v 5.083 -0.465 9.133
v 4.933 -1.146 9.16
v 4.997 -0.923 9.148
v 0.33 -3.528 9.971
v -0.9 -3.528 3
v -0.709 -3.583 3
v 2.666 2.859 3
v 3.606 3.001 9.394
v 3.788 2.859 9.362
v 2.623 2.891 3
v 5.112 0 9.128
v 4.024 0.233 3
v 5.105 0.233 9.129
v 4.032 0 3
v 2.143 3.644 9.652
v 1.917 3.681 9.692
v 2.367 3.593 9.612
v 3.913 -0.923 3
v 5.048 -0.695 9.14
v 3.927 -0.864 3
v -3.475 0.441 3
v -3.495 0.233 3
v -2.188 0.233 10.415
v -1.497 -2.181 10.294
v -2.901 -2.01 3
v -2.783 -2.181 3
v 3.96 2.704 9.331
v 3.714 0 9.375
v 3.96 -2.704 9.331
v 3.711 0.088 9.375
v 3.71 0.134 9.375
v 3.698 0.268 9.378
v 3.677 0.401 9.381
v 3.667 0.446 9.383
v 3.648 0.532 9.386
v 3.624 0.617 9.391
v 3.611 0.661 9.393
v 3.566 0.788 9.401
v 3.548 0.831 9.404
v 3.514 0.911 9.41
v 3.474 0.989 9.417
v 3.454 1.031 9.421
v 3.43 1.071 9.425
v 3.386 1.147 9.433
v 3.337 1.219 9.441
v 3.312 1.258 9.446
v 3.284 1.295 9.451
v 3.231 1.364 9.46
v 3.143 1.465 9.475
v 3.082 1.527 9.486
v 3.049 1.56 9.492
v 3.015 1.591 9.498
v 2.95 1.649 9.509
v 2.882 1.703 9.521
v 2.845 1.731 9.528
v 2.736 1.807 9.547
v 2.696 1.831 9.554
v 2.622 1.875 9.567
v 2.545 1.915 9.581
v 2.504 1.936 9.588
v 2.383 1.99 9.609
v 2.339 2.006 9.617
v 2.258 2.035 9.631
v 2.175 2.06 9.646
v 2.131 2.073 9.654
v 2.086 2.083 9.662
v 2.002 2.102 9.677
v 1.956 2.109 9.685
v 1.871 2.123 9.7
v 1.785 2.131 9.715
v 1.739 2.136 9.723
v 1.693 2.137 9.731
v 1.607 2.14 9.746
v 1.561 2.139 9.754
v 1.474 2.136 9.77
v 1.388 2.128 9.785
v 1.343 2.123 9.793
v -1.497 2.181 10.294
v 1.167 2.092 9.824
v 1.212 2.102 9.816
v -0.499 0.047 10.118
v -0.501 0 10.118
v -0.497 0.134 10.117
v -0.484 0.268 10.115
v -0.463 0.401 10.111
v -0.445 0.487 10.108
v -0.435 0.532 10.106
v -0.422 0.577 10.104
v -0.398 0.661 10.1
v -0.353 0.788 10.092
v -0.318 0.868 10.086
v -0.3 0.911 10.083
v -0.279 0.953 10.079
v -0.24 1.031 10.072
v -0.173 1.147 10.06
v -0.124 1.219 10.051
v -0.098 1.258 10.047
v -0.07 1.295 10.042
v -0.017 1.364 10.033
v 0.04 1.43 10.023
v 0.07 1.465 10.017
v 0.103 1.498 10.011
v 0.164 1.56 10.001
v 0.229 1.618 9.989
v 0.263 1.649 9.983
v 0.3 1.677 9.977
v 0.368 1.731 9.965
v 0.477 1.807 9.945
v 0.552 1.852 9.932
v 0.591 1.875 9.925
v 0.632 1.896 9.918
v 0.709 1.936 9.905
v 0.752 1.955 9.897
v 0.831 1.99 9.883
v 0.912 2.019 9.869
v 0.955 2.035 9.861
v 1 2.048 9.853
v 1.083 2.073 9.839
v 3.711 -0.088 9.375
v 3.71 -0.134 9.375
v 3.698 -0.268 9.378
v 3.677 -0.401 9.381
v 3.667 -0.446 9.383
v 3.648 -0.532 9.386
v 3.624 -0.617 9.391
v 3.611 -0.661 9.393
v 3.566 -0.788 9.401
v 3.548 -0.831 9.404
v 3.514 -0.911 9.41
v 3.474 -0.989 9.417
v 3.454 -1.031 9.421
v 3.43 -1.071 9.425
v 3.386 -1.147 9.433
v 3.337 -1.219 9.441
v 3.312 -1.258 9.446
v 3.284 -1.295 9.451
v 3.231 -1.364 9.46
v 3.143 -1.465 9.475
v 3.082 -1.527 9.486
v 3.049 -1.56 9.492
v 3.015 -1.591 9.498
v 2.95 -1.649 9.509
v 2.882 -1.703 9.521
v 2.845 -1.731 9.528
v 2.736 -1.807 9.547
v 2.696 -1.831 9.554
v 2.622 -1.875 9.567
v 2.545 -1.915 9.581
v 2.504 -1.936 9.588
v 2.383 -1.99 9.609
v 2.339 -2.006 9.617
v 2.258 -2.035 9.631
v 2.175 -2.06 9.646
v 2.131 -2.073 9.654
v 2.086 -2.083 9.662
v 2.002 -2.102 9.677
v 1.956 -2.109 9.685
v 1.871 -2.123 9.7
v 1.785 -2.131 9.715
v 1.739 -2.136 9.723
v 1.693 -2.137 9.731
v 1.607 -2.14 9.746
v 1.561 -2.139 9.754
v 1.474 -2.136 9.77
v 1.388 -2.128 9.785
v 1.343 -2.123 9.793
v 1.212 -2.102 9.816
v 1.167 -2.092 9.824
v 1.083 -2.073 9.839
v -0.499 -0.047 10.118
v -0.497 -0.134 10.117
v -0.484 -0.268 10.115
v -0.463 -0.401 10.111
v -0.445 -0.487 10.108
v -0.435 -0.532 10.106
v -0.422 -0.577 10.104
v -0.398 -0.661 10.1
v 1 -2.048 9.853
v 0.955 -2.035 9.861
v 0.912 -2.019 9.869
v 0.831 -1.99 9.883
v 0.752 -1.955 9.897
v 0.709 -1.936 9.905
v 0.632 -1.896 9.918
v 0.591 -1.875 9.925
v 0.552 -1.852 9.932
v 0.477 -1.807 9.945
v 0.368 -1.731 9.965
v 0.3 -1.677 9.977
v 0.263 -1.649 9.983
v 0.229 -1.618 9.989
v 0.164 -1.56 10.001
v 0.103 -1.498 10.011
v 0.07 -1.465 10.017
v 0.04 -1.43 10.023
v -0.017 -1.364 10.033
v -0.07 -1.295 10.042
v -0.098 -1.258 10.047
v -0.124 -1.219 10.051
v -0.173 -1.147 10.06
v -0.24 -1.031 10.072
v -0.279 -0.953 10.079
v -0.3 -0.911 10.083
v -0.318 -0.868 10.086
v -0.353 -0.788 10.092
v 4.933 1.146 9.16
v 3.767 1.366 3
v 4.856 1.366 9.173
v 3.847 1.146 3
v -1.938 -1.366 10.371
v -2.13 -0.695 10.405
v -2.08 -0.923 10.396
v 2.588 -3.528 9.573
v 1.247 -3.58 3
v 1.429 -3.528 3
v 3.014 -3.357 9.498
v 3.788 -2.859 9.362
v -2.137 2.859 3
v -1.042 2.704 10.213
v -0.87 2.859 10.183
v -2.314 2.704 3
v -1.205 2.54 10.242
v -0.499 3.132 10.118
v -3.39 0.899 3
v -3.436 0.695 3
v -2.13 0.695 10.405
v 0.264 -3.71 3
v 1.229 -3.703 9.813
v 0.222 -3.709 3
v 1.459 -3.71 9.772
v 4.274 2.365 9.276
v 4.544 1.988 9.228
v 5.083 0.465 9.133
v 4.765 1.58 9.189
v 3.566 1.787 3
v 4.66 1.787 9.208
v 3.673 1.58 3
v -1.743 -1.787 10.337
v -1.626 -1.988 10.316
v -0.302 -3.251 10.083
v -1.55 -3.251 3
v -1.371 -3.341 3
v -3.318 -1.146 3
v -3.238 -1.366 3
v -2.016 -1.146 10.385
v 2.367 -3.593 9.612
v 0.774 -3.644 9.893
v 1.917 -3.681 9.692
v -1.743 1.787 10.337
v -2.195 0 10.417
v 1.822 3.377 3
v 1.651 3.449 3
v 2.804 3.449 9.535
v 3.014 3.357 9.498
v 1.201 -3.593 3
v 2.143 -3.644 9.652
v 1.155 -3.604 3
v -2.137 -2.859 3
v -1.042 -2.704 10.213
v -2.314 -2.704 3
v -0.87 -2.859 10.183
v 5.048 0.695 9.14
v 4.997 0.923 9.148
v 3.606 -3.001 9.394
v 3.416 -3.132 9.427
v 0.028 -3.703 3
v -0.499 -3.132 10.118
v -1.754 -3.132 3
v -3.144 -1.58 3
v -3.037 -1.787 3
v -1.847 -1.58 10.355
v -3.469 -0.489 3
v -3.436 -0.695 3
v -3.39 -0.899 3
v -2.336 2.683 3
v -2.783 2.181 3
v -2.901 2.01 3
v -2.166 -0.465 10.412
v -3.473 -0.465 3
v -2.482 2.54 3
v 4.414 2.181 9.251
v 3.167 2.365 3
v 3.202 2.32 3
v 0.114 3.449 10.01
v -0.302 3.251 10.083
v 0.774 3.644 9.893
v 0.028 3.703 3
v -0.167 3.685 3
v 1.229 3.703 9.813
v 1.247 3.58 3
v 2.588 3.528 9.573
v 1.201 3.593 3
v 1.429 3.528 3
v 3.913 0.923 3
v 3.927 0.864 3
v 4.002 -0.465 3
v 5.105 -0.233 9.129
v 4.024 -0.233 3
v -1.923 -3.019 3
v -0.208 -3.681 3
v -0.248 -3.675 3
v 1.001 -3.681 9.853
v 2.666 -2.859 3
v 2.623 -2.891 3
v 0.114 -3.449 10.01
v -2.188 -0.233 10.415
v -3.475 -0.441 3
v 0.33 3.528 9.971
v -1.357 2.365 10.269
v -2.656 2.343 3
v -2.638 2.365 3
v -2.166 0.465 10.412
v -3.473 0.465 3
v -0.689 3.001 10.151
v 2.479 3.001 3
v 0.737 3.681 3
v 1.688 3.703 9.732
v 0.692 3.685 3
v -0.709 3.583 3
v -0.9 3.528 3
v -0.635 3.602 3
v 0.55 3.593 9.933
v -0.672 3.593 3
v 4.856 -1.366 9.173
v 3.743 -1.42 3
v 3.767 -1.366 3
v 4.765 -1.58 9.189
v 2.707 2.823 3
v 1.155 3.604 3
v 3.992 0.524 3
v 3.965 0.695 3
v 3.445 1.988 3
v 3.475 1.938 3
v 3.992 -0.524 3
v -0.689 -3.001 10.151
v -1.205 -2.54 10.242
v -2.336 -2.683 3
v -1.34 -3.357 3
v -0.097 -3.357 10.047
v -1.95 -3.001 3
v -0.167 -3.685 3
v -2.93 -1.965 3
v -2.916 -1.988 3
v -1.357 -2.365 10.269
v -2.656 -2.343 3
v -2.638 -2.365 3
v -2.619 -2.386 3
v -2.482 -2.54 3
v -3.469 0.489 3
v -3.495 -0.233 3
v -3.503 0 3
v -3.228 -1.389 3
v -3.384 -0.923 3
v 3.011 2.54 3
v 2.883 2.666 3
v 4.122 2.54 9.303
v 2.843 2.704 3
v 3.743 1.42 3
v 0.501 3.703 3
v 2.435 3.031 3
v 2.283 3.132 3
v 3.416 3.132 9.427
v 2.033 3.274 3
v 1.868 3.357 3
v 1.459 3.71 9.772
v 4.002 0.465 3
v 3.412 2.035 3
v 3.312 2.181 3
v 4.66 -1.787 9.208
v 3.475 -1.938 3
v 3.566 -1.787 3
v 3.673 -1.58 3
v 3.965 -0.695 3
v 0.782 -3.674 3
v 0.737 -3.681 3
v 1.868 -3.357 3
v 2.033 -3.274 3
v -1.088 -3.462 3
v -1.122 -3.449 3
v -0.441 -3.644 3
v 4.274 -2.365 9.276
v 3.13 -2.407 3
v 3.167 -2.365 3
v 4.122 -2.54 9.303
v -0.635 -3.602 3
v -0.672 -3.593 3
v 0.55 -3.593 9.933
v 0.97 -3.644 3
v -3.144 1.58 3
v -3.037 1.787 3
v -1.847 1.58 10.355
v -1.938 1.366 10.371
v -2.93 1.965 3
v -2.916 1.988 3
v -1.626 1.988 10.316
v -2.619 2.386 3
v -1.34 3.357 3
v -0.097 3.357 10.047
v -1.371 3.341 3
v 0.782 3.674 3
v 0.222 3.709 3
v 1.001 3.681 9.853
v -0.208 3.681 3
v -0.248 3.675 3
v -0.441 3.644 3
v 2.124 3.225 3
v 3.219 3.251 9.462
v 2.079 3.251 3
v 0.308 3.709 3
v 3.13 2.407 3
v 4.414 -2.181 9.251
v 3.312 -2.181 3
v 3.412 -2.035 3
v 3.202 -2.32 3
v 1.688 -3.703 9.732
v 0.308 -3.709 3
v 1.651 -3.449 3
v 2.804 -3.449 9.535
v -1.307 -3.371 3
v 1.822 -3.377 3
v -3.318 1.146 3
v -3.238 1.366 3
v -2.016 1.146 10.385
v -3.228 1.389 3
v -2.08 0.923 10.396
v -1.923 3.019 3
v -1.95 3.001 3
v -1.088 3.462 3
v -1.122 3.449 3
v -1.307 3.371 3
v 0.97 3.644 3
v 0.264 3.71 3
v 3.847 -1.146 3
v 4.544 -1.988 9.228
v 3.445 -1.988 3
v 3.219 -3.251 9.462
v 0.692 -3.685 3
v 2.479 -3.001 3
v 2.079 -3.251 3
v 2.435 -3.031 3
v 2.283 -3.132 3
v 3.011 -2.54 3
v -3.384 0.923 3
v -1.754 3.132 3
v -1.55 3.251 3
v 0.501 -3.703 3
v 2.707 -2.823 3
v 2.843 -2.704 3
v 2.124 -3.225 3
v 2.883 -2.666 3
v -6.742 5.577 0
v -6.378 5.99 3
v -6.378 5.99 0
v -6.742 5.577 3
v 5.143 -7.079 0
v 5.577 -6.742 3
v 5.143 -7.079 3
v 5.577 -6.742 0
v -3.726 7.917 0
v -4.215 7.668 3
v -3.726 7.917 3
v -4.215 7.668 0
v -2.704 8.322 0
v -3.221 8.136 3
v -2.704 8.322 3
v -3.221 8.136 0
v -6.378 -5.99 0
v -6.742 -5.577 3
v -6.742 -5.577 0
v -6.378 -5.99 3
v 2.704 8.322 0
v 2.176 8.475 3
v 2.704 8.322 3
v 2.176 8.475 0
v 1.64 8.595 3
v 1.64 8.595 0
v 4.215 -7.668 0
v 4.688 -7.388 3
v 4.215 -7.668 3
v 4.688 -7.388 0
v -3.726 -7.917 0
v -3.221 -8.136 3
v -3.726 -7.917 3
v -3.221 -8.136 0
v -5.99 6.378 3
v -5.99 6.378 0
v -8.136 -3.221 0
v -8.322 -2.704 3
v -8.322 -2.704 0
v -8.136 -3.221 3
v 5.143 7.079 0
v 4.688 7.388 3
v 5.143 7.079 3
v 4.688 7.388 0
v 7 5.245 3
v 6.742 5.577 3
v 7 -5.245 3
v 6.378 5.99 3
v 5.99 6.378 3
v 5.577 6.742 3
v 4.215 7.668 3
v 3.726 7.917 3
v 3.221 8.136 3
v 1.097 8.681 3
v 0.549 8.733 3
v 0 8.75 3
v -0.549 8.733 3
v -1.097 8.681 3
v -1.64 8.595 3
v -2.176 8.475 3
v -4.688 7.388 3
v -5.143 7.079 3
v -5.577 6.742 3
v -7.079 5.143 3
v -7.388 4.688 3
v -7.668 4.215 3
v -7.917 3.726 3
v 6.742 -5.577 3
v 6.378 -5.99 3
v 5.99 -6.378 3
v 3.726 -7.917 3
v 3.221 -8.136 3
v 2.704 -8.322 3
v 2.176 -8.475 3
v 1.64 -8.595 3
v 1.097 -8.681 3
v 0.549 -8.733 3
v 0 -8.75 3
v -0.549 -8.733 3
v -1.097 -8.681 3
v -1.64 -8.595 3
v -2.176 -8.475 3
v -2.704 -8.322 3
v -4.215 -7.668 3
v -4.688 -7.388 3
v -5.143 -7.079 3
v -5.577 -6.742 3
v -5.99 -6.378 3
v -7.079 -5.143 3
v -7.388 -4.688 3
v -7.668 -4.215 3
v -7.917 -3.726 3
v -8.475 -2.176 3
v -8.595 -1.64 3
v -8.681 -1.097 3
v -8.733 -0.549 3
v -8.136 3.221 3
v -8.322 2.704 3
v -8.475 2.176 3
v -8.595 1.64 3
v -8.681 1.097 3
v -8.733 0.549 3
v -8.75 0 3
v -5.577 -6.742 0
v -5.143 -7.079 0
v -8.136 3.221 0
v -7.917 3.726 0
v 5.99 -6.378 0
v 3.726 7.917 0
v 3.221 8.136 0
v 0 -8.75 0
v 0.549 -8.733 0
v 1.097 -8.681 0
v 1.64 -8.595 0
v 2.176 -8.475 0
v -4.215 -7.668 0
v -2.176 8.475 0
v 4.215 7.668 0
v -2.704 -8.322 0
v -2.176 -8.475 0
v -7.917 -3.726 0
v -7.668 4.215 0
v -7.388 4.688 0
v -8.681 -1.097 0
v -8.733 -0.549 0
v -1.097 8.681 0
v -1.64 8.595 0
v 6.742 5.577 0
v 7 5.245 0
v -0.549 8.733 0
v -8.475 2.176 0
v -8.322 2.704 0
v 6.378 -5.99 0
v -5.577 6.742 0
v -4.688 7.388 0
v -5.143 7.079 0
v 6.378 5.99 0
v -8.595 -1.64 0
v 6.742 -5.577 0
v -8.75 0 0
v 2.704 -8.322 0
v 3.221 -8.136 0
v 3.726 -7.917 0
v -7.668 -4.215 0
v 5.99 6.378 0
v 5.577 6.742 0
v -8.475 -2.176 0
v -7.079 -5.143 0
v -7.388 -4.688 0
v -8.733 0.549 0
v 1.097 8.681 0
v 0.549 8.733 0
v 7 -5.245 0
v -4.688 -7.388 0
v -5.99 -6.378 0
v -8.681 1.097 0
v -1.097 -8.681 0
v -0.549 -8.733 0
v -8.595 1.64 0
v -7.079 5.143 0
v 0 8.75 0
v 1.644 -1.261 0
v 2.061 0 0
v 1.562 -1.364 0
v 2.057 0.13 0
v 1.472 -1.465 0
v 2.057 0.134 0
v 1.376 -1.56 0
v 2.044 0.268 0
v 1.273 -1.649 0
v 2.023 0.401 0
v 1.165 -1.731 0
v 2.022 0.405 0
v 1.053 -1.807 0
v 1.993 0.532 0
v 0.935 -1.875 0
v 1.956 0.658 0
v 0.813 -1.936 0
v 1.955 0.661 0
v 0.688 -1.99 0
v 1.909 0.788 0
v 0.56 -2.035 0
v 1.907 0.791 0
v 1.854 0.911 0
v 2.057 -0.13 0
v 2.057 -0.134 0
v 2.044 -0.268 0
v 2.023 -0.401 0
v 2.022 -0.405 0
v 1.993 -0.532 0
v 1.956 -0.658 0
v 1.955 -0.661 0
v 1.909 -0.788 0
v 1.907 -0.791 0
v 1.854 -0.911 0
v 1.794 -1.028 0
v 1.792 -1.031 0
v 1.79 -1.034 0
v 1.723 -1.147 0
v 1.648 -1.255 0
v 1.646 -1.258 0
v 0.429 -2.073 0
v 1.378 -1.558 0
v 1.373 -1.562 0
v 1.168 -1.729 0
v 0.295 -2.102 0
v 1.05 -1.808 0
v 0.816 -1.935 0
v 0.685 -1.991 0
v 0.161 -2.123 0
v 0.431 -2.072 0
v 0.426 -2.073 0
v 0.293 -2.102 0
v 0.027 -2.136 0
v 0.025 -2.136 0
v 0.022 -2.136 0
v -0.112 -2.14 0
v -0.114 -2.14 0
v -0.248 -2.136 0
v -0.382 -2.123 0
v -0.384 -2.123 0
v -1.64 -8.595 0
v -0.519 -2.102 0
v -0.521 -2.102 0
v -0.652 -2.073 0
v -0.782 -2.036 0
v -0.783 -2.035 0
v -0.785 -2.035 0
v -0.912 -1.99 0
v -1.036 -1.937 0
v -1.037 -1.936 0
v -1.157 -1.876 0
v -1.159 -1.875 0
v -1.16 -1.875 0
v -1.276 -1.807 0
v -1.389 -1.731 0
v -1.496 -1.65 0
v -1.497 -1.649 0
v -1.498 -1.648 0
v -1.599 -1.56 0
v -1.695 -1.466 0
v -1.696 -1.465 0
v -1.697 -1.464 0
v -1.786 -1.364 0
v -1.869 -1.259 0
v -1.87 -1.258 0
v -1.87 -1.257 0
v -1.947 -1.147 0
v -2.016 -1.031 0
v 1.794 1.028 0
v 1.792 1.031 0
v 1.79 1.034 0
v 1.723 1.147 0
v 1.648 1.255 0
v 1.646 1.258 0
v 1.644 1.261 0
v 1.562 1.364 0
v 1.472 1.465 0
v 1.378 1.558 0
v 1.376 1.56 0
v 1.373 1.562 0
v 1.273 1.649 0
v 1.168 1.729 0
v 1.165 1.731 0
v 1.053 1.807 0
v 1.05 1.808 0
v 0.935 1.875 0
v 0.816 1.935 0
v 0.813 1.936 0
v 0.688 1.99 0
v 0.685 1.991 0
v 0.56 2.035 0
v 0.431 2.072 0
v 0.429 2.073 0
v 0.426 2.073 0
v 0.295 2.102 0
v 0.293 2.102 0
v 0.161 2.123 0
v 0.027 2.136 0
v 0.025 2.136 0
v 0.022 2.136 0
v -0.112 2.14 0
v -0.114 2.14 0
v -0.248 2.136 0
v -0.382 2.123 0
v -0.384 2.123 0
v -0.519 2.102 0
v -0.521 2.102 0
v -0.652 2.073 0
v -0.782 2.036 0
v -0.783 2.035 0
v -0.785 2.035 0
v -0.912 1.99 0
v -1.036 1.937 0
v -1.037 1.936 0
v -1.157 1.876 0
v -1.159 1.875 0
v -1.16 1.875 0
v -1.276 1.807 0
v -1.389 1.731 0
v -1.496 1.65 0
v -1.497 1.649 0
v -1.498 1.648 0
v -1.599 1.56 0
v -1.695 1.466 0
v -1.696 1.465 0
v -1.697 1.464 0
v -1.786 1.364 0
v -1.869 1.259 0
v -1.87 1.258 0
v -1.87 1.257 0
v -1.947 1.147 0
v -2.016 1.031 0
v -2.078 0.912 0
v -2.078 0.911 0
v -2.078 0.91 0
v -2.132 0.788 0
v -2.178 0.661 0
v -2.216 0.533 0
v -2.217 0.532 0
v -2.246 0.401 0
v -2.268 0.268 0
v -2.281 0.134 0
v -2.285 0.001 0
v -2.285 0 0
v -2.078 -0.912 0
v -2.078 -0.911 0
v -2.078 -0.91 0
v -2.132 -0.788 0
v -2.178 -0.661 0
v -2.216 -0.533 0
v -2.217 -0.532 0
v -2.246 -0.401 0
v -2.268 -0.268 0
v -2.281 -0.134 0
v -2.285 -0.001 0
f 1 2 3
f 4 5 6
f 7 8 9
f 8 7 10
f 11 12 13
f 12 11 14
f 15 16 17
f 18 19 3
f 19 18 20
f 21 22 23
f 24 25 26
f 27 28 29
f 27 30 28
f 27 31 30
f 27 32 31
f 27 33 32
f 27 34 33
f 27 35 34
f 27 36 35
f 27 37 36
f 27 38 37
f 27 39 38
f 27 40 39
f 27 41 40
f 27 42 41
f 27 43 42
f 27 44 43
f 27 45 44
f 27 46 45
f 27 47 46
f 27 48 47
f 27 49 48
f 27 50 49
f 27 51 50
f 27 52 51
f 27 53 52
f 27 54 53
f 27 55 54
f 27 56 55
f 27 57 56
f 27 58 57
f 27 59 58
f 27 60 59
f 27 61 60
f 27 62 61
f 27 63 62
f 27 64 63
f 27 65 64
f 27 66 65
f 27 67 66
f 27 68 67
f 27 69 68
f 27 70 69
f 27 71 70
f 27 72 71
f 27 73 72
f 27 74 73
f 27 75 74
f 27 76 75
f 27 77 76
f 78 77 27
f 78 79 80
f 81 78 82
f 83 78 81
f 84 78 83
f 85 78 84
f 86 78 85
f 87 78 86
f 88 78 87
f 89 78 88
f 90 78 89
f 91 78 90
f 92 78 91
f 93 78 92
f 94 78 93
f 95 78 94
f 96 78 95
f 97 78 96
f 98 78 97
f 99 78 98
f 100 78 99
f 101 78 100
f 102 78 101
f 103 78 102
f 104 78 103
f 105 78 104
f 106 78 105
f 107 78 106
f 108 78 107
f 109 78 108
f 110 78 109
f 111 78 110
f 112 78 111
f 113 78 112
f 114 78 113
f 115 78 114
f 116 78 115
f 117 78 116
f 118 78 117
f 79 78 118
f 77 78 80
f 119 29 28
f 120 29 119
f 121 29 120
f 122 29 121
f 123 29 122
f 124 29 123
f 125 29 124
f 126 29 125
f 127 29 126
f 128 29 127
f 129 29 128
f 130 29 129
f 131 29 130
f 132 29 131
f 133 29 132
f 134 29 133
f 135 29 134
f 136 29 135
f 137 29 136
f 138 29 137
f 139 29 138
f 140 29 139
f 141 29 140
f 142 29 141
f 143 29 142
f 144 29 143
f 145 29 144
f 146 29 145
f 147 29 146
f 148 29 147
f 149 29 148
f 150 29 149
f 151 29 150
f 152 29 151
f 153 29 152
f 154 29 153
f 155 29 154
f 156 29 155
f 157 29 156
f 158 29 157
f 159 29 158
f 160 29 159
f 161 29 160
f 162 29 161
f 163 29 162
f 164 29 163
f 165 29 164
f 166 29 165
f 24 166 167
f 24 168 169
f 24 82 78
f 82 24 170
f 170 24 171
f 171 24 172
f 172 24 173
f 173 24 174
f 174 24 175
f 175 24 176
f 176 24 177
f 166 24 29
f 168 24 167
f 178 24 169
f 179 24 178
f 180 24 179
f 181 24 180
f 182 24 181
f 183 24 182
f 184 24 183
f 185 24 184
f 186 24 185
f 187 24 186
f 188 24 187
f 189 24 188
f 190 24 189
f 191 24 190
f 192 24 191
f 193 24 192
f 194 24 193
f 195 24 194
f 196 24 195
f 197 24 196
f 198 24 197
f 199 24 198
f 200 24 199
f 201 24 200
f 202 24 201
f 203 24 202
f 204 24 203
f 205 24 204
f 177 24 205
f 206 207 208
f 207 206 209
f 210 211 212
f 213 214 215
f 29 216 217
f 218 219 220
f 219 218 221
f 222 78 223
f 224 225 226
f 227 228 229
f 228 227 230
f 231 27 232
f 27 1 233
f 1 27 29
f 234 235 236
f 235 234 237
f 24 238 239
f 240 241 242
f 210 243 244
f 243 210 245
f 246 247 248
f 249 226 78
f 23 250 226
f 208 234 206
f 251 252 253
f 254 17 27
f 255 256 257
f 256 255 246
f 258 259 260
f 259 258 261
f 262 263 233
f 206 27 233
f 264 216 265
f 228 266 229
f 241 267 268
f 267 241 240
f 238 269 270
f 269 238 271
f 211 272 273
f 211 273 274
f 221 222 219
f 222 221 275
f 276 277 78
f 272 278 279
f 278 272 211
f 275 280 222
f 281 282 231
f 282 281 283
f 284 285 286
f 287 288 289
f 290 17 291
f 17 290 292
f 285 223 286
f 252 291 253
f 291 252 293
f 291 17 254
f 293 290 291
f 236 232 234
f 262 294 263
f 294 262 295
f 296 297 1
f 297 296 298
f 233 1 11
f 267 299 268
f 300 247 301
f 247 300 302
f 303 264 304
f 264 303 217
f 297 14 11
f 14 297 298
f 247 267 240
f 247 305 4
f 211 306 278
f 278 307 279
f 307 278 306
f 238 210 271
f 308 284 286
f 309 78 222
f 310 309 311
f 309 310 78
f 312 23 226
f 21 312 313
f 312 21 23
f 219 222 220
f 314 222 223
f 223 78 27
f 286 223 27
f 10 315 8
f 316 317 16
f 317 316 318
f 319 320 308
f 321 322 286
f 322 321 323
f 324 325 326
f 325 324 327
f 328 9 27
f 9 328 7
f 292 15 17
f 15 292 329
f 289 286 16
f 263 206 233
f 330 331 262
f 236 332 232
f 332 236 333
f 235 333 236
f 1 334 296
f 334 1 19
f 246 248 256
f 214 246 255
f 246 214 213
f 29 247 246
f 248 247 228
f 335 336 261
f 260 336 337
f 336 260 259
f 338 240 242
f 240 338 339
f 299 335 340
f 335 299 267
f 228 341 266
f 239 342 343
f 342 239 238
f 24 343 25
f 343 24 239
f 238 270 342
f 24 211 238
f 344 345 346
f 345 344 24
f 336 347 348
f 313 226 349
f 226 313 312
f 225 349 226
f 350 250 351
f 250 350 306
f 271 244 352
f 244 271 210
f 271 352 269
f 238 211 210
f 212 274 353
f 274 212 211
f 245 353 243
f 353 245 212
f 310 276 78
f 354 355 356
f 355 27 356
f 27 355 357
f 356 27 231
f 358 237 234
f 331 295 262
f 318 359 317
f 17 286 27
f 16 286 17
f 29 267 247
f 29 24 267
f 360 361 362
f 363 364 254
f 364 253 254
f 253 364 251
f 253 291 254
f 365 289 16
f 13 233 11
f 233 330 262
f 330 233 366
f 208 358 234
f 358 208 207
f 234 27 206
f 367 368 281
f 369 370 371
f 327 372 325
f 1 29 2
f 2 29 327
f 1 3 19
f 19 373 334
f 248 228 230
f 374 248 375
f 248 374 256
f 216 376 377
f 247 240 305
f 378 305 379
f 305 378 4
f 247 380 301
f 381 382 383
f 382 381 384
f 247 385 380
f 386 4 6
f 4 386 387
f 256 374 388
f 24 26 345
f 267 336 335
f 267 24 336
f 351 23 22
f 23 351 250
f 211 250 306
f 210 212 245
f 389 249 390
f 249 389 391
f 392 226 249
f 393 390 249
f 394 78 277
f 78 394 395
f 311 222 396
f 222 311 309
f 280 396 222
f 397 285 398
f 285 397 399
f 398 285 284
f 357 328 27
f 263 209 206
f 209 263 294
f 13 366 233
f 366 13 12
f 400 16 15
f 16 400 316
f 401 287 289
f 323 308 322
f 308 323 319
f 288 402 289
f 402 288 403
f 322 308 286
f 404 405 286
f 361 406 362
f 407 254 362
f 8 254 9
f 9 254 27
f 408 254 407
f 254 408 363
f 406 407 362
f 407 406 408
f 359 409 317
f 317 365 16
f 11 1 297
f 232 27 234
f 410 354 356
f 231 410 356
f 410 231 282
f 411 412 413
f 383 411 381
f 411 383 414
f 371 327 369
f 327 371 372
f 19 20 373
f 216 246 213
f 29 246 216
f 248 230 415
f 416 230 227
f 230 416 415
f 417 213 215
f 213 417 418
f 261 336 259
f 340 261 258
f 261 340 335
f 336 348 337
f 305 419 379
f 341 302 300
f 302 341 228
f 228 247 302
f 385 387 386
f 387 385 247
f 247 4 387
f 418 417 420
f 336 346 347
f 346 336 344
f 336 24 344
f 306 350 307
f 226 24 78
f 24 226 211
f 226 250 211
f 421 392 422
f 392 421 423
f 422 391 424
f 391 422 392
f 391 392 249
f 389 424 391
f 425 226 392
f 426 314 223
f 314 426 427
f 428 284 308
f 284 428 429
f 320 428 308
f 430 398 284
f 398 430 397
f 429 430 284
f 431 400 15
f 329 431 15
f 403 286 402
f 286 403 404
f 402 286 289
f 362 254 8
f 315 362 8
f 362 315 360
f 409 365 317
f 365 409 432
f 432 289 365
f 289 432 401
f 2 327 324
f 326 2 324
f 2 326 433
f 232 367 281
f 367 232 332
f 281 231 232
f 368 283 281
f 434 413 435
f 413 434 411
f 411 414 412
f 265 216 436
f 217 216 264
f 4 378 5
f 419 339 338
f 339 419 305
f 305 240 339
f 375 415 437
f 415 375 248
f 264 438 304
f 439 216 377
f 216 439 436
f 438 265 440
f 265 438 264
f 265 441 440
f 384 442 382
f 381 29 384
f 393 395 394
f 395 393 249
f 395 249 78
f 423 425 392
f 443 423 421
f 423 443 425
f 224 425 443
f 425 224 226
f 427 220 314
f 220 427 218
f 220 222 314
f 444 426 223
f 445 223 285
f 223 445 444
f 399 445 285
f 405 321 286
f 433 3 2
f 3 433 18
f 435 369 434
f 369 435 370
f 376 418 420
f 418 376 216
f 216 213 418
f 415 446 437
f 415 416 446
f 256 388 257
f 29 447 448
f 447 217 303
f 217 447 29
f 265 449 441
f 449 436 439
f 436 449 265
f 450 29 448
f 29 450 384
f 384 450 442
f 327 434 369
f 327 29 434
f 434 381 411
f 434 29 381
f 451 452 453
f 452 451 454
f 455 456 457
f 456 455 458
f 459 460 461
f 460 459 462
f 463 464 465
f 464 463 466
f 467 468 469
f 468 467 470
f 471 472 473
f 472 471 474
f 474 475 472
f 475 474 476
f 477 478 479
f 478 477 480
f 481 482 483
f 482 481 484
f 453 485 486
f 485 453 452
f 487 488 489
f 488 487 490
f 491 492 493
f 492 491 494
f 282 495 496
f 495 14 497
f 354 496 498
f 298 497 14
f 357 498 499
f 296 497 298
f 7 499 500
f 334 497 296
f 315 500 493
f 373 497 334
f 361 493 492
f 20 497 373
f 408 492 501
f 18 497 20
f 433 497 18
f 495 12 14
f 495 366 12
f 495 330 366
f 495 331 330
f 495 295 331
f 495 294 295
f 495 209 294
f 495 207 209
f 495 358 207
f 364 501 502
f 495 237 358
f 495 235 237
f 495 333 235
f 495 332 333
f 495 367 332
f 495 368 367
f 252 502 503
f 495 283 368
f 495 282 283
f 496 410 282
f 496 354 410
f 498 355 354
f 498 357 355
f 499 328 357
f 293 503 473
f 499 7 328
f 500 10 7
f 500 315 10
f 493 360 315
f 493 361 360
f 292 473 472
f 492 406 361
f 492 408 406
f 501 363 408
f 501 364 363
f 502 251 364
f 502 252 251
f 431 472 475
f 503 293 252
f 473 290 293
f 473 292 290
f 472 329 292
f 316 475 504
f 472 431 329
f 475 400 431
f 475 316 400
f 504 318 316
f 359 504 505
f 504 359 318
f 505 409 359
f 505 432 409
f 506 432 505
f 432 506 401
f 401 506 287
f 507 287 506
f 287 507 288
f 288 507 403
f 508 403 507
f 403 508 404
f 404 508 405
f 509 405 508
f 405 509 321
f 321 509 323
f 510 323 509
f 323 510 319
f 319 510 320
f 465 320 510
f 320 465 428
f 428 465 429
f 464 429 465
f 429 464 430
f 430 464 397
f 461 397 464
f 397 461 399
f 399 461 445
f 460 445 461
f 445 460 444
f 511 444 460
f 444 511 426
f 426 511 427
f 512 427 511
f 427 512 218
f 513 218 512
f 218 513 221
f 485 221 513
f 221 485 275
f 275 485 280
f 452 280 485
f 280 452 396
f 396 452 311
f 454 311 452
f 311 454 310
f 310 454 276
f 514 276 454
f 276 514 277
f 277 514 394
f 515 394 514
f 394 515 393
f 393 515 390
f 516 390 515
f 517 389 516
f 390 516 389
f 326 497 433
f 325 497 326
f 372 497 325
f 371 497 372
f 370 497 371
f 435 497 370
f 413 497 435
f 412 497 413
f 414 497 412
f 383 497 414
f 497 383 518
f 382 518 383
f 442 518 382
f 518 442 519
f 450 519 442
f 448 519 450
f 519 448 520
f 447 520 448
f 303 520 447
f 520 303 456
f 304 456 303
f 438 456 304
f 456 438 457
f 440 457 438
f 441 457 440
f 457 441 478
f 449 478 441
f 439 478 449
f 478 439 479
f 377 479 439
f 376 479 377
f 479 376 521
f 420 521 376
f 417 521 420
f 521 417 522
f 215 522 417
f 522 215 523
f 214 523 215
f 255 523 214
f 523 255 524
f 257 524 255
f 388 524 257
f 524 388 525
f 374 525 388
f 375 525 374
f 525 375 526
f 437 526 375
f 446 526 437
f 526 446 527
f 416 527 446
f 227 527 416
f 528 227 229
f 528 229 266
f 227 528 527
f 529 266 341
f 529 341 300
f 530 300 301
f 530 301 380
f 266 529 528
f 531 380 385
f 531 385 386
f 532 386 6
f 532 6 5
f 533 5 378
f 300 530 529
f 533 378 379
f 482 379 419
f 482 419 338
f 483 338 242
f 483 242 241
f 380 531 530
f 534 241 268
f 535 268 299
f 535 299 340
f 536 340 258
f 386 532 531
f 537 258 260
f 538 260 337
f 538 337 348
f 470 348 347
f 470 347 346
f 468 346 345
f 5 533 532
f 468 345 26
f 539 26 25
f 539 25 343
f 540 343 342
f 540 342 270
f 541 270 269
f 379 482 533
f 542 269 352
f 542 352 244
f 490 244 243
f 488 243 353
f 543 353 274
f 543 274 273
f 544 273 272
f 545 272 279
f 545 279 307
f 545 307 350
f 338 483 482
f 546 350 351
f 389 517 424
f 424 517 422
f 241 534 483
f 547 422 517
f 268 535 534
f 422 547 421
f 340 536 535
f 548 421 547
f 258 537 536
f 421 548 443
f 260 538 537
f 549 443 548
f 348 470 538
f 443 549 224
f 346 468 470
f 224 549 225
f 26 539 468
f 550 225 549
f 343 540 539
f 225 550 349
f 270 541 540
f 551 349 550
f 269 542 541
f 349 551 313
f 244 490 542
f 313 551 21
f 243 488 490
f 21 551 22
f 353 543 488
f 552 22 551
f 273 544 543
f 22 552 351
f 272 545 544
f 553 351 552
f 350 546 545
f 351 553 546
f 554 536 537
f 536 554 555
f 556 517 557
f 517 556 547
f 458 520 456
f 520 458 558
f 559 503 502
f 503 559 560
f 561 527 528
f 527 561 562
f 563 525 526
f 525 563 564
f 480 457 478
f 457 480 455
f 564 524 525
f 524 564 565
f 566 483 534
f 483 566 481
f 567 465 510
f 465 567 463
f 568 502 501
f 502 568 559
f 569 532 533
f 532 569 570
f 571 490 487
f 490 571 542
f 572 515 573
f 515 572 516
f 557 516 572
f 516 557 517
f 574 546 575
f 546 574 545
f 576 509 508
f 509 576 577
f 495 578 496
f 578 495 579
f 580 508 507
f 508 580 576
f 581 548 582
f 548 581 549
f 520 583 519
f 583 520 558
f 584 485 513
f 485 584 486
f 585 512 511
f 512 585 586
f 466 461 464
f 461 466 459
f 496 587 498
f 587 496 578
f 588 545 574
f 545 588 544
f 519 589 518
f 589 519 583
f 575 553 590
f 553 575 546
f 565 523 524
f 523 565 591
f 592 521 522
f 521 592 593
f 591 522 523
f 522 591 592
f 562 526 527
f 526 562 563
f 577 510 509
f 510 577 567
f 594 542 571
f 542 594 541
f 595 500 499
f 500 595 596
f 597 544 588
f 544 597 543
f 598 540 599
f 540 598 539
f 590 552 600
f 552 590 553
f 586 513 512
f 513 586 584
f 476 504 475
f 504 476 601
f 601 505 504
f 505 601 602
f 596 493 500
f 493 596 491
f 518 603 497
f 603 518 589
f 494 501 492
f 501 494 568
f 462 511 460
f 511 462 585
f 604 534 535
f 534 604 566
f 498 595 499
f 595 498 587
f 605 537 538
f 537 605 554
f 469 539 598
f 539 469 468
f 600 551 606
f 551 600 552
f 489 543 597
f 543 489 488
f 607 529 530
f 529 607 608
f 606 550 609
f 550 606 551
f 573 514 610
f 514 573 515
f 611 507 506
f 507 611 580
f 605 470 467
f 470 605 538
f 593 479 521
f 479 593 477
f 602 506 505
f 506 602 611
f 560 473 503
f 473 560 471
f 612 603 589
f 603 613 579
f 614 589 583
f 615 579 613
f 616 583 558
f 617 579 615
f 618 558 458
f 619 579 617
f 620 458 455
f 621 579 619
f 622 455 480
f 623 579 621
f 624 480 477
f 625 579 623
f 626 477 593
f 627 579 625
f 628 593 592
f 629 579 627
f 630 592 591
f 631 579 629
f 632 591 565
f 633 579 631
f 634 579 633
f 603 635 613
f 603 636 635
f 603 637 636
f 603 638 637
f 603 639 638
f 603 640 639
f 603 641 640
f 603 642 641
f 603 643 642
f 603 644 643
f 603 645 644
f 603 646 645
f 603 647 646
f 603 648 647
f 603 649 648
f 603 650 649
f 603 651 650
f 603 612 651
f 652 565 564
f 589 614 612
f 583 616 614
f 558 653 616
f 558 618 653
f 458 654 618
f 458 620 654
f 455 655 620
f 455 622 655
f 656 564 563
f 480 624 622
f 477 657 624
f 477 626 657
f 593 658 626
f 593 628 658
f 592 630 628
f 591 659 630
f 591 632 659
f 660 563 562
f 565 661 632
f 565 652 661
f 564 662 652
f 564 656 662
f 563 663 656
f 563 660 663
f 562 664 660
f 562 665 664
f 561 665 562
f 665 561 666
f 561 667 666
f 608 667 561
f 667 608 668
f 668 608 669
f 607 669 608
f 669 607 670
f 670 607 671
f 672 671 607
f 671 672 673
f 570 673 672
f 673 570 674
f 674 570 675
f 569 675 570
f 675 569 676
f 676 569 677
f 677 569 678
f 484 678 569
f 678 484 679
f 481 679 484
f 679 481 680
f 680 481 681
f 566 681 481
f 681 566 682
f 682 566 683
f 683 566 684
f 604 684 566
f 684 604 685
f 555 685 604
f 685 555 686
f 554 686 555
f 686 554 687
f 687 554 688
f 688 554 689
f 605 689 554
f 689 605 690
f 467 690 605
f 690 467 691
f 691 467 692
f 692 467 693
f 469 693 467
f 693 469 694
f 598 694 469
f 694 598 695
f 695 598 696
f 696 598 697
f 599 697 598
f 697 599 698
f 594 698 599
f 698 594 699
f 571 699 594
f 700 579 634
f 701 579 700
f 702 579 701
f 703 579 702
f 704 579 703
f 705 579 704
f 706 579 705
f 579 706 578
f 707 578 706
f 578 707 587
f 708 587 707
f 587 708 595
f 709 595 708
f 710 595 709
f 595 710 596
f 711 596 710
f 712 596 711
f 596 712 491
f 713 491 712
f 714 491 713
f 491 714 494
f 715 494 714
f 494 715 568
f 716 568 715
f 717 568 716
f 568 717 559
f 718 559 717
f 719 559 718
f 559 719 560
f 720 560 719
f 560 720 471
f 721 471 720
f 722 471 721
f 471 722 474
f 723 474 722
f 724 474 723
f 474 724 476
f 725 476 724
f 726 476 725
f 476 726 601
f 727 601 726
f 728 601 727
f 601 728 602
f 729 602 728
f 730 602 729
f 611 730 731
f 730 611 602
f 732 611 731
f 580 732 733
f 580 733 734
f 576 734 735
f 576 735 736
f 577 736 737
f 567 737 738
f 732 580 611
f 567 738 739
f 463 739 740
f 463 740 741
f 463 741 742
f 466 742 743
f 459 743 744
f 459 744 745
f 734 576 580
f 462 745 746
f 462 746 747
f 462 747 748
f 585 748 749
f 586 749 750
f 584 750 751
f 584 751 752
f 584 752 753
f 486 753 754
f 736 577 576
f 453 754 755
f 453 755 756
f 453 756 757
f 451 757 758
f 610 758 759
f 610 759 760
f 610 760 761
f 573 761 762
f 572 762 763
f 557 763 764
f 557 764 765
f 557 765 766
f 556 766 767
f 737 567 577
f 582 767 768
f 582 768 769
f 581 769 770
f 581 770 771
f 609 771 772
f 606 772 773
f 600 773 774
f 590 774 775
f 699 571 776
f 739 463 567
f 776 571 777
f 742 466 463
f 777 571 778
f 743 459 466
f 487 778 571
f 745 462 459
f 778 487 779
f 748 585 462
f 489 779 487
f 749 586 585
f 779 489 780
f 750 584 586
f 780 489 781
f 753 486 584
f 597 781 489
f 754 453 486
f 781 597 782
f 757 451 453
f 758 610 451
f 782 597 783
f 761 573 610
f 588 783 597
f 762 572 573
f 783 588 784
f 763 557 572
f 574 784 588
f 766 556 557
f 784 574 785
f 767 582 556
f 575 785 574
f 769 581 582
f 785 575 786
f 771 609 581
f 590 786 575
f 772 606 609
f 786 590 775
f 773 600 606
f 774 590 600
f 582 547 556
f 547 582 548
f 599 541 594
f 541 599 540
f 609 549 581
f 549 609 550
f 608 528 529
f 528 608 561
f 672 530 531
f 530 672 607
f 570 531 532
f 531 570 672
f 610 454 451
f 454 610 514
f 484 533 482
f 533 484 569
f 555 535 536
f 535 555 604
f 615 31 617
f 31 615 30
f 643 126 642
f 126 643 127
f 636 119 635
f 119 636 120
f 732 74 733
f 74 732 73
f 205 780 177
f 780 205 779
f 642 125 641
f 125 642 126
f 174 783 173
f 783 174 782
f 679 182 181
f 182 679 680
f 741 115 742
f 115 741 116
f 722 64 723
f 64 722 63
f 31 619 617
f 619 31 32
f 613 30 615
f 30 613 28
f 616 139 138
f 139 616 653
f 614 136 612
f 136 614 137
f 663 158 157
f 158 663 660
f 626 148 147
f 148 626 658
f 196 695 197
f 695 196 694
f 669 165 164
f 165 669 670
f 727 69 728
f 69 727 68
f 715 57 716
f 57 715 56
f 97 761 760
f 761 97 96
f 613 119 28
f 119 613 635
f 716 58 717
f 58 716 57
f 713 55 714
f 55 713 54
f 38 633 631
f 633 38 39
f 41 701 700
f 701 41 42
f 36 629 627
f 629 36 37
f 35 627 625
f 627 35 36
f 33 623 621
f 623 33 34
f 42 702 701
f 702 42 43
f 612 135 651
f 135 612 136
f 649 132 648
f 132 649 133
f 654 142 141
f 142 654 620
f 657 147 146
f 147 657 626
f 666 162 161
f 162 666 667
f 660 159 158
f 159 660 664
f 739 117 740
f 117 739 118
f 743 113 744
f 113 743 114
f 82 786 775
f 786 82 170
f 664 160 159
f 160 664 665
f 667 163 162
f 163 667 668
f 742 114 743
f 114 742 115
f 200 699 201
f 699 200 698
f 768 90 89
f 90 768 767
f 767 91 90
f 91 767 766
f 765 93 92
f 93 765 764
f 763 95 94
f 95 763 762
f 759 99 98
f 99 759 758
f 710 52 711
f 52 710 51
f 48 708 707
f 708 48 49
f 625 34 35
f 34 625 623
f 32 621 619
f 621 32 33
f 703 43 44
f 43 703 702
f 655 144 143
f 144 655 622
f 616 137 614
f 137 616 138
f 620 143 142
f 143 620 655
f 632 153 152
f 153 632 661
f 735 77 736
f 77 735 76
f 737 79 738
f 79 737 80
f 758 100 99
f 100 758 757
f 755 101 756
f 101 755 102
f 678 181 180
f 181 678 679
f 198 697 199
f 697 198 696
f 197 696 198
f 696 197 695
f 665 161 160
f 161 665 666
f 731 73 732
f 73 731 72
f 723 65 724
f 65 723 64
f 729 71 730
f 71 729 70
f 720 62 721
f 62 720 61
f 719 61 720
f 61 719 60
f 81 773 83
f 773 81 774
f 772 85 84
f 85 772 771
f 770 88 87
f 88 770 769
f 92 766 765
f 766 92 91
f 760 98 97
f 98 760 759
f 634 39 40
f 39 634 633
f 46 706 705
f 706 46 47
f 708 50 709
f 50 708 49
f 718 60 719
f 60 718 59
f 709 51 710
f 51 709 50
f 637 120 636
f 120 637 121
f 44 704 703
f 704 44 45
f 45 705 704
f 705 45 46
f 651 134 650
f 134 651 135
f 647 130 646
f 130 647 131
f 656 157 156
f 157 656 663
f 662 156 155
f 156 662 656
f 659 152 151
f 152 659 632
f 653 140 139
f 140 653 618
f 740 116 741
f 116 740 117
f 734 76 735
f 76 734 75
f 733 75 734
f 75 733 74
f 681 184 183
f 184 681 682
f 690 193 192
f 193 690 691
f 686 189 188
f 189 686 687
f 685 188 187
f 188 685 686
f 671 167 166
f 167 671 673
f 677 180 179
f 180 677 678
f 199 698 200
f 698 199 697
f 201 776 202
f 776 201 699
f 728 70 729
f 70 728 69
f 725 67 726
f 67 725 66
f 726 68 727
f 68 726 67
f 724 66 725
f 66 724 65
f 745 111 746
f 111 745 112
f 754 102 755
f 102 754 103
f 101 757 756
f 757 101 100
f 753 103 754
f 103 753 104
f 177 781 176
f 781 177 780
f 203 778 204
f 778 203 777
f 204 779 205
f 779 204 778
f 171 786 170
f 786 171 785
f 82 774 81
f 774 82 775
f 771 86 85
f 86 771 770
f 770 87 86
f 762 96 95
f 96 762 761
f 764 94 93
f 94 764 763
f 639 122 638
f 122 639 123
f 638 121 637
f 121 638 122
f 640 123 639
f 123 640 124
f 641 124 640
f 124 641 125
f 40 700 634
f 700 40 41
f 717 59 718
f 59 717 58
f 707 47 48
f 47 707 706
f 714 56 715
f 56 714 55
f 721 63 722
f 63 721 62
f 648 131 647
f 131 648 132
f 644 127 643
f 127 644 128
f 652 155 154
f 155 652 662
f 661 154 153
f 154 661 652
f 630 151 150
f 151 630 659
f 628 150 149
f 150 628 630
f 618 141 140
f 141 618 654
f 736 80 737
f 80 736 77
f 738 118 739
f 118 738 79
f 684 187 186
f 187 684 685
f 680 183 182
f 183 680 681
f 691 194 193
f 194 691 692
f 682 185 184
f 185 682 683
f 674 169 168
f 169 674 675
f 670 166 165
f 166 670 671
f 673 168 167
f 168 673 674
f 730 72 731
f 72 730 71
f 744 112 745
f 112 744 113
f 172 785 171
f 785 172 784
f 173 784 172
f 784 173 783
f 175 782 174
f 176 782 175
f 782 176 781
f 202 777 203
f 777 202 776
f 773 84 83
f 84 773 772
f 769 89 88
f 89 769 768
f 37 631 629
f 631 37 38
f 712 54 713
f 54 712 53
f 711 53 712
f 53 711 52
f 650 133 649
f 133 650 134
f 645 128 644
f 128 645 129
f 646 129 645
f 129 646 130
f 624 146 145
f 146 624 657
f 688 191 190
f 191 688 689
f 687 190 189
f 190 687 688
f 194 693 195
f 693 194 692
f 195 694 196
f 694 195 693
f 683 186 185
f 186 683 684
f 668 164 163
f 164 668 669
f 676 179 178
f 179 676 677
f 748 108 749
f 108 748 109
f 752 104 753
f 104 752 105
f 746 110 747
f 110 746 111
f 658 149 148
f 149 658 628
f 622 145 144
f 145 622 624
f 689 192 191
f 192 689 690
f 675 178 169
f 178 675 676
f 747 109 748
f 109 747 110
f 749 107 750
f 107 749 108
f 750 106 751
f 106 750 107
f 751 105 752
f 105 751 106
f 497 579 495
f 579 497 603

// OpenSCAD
$fn=100;

shrink=1.06; // PETG shrink factor
fit=shrink+0.01; // % fit tolerance
thick=2.5;
slot=0.5;
diam=7;

grommet();
//translate([30,0,0]) filter();

module grommet(){
    echo(diam*shrink);
    
    
    
    
    difference(){
        union(){
            translate([0,0,1.5])
            rotate([0,10,0])
            cylinder(d=diam*shrink,h=diam*1.2);  
          
          
            cylinder(d=diam*2.5,h=3);   
           
            
        }
        
        translate([-.2,0,-.5])
        rotate([0,10,0])
        cylinder(d=4*fit,h=30);
        
        translate([diam,-diam,-.1])
        cube([diam,diam*2,diam]);
    }
}    

module filter(){
    echo(diam*fit);
    translate([thick,0,30-thick])
    cube([15,20,0.5]);  

    difference(){
        union(){
            cube([20,20,30]);    
        }
        translate([thick,-thick,thick])
        cube([15,20,25]);  
        
        translate([10,10,-.1])
        cylinder(d=diam*fit,h=33); 
        
        // Slots
        translate([20-thick-1,thick,-.1])
        rotate([0,0,45])
        cube([slot,19.5,thick+1]);    

        translate([thick,thick+1,-.1])
        rotate([0,0,-45])
        cube([slot,19,thick+1]);    
        
    }    
}
